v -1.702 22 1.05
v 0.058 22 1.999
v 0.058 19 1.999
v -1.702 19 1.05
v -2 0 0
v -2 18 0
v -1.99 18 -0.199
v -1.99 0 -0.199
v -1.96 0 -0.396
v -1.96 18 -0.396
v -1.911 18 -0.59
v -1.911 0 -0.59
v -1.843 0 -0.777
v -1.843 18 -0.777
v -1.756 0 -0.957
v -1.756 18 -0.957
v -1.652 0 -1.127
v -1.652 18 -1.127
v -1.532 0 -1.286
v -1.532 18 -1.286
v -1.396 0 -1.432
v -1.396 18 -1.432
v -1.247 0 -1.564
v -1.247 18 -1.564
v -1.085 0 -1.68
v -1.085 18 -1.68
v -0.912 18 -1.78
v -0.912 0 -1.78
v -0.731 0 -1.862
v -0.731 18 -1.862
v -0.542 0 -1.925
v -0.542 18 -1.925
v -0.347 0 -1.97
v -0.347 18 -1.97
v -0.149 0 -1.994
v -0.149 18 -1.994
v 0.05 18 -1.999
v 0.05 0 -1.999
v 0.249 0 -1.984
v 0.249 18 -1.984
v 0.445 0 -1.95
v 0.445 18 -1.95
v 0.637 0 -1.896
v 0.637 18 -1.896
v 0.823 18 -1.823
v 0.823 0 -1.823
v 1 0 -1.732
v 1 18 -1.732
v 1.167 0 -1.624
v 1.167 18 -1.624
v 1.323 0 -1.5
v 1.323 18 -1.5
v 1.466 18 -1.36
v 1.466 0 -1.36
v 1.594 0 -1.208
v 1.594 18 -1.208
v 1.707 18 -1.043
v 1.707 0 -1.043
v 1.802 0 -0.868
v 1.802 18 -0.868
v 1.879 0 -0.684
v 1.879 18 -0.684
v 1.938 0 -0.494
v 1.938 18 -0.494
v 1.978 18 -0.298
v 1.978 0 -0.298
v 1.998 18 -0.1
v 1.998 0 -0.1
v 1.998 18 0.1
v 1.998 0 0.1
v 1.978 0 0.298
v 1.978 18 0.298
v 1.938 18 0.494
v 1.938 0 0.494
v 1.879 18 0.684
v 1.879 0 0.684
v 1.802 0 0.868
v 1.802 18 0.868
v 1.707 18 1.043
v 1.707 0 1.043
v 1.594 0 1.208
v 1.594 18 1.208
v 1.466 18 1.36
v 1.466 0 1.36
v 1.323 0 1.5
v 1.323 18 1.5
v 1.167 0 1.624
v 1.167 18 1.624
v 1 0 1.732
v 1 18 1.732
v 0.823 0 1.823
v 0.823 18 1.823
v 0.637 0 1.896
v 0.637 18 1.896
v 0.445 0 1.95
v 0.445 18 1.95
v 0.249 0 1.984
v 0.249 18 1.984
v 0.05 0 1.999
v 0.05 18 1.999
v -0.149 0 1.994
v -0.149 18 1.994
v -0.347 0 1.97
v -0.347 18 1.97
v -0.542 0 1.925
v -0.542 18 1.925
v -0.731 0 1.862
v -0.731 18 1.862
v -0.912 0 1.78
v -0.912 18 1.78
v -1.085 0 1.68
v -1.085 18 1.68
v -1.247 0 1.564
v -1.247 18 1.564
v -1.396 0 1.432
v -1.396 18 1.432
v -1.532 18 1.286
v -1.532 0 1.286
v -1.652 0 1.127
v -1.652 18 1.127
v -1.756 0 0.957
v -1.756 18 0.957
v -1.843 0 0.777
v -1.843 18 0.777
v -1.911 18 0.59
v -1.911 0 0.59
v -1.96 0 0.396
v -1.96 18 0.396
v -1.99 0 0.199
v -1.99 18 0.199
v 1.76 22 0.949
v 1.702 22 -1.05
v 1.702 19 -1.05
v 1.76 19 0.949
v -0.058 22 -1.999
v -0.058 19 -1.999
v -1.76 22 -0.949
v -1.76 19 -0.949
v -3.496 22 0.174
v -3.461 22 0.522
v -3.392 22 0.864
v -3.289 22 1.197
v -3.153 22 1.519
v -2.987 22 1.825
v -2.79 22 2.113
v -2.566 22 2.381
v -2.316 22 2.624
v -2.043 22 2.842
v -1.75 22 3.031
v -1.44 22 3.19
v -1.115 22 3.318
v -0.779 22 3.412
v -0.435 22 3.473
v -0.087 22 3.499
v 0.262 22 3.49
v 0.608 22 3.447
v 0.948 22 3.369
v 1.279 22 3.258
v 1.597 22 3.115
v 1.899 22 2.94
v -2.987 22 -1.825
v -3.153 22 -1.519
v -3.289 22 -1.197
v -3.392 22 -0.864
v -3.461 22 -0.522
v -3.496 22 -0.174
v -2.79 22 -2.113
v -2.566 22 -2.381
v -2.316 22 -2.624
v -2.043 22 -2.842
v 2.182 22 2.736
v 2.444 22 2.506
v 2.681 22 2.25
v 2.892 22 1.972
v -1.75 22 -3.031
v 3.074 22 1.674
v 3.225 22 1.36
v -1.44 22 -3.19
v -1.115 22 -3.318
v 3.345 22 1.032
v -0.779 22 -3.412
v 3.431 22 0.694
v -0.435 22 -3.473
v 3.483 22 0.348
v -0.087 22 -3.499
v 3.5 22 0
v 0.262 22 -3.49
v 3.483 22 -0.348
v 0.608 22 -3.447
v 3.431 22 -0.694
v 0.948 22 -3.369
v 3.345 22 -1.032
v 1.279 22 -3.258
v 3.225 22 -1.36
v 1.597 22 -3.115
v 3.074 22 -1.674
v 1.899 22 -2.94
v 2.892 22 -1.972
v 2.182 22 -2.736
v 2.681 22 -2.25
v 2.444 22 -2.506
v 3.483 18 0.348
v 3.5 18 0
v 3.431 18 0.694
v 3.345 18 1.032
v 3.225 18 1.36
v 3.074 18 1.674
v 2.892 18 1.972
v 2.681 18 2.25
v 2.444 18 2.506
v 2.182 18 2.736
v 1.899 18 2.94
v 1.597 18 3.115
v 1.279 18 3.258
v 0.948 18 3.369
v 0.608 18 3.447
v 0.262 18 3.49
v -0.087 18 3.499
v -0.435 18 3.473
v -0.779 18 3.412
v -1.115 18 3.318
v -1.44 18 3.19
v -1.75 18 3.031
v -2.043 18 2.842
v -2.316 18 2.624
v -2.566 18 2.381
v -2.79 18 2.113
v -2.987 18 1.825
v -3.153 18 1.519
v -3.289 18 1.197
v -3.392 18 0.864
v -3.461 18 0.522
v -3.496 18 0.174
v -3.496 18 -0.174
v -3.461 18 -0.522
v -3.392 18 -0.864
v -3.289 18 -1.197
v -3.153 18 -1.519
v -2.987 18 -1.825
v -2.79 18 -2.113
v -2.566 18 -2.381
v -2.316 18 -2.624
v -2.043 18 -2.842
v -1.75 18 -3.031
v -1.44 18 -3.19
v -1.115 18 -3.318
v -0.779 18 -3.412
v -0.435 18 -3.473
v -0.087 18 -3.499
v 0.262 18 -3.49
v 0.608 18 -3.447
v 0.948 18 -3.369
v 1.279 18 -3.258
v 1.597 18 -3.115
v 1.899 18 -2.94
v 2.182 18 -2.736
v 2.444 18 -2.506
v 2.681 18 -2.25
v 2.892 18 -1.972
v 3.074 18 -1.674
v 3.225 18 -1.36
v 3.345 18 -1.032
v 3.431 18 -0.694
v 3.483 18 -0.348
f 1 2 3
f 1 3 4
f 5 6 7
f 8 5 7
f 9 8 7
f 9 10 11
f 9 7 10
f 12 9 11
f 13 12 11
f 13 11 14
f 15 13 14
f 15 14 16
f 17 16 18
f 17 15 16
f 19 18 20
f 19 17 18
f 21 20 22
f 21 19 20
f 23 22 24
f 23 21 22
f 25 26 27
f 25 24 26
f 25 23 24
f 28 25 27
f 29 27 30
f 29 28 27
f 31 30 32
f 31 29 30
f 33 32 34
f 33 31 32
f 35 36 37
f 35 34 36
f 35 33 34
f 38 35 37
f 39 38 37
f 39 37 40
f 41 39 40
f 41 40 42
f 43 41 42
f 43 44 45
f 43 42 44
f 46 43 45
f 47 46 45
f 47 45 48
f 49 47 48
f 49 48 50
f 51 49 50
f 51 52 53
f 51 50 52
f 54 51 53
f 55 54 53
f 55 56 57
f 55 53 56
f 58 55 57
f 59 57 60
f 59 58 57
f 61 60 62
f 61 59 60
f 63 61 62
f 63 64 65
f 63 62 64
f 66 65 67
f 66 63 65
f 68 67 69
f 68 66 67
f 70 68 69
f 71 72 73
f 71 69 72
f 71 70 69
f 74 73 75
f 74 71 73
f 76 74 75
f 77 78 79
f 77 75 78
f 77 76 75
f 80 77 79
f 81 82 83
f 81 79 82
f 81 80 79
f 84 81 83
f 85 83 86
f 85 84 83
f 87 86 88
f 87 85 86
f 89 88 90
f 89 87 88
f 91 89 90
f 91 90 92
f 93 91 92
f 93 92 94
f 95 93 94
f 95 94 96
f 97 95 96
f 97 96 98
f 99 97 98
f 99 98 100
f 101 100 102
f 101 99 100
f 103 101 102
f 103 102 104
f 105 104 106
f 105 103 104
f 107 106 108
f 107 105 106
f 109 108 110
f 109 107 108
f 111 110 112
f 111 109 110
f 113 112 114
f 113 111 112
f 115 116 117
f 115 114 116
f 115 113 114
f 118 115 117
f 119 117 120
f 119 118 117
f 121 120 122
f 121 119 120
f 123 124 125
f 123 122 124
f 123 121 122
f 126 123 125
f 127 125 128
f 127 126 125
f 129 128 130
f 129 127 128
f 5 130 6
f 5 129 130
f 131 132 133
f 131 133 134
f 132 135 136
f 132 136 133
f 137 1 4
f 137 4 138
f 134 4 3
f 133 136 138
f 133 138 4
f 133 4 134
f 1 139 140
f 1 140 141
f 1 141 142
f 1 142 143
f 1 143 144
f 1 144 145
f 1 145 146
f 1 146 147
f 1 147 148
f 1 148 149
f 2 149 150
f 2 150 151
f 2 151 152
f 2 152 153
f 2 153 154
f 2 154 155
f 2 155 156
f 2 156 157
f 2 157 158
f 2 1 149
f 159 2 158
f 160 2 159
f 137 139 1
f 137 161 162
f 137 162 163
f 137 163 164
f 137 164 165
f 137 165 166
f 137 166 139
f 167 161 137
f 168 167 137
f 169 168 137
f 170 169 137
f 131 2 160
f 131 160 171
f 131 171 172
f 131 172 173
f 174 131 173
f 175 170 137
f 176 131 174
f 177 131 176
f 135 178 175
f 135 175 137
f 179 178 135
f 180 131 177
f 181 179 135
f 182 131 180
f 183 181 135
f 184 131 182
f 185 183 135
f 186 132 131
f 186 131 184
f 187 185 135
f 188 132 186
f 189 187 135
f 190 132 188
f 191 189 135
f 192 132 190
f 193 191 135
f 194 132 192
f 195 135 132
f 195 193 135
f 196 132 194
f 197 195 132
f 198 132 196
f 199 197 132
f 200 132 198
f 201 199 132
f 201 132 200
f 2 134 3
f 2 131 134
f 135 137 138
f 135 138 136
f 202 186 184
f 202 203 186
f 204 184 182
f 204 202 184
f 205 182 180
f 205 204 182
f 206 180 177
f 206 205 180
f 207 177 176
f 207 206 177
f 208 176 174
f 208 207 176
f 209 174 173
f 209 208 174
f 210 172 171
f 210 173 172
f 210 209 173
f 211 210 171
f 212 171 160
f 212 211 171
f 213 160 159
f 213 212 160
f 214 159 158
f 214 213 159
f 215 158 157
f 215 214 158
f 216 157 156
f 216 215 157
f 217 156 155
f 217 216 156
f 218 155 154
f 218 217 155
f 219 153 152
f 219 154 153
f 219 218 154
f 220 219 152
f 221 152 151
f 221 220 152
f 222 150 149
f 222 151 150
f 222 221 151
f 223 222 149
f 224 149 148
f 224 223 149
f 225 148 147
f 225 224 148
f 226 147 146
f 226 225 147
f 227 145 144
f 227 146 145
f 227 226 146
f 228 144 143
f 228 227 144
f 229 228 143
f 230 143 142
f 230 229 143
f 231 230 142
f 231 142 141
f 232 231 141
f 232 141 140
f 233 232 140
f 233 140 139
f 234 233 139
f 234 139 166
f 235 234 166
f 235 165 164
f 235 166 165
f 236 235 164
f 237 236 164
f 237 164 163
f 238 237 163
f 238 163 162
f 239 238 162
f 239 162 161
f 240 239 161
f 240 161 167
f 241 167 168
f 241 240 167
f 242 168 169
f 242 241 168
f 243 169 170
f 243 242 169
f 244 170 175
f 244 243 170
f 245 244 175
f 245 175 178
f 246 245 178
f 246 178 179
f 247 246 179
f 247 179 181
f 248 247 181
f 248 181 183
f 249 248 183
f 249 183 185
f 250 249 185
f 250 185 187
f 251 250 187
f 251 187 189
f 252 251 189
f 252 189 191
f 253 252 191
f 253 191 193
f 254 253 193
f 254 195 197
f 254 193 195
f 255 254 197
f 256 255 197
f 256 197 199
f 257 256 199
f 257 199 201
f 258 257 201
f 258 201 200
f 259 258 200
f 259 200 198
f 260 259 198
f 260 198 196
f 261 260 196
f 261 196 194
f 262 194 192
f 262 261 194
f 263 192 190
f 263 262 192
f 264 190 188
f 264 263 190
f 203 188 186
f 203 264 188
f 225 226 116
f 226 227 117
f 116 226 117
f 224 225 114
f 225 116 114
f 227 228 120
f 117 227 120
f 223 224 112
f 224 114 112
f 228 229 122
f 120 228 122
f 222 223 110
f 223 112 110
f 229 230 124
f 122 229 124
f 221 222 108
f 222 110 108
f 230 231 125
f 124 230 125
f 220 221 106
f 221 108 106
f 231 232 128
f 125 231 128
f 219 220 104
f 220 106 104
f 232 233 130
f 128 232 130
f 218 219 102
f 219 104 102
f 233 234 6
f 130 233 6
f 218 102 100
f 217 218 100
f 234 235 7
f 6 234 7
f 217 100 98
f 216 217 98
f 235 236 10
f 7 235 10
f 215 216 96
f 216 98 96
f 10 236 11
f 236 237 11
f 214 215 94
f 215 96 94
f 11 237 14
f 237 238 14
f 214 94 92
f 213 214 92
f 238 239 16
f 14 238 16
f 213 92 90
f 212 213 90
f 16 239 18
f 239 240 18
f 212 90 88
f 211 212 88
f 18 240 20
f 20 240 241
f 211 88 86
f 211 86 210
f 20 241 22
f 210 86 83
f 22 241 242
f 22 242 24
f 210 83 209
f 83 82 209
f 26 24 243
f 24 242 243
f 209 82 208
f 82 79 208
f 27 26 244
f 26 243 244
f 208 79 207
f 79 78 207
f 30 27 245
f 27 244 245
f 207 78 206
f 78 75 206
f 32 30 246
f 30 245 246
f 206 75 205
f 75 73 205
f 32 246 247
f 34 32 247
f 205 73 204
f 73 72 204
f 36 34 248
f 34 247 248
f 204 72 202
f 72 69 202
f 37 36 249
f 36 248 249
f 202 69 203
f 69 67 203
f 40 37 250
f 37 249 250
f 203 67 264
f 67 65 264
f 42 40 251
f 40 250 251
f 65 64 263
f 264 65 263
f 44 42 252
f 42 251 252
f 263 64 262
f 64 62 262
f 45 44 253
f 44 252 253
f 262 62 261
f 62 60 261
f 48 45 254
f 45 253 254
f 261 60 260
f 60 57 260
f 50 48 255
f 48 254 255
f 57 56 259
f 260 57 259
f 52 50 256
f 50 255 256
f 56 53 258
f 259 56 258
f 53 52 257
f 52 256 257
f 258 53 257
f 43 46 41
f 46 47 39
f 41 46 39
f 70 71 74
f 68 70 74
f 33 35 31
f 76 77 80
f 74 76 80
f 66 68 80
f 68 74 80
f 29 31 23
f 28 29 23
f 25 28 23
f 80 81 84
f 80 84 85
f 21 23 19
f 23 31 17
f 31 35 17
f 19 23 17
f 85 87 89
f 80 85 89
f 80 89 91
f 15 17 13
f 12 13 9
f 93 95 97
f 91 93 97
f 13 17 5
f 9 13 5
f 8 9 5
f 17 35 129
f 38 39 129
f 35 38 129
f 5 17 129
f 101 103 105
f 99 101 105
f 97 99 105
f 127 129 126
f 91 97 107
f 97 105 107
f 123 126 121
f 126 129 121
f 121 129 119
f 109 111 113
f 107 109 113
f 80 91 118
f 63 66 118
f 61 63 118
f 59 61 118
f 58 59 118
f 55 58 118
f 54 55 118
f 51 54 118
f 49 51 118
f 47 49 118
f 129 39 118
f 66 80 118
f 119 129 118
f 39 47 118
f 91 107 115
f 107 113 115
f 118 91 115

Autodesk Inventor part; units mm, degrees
ref_plane "YZ Plane" through (0, 0, 0) normal (1, 0, 0) x (0, 1, 0)
ref_plane "XZ Plane" through (0, 0, 0) normal (0, 1, 0) x (-1, 0, 0)
ref_plane "XY Plane" through (0, 0, 0) normal (0, 0, 1) x (1, 0, 0)
sketch "Sketch1" plane through (0, 0, 0) normal (0, 1, 0) x (-1, 0, 0)
  circle A0 centre (0, 0) radius 2
  dimension "d0" = 4
extrude "Extrusion1" add sketch "Sketch1" along normal blind 18
sketch "Sketch2" plane through (0, 18, 0) normal (0, 1, 0) x (1, 0, 0)
  circle A0 centre (0, 0) radius 3.5
  dimension "d5" = 7
thread "Thread1" size "M4x0.7" class "6g" standard "ANSI Metric M Profile" full length
extrude "Extrusion2" add sketch "Sketch2" along normal blind 4
sketch "Sketch3" plane through (0, 22, 0) normal (0, 1, 0) x (1, 0, 0)
  circle A0 centre (0, 0) radius 3.5 projected
  circle A1 centre (0, 0) radius 2 projected
  line L0 (-1.7603, 0.9494) -> (-0.058, 1.9992)
  line L1 (-0.058, 1.9992) -> (1.7023, 1.0498)
  line L2 (1.7023, 1.0498) -> (1.7603, -0.9494)
  line L3 (1.7603, -0.9494) -> (0.058, -1.9992)
  line L4 (0.058, -1.9992) -> (-1.7023, -1.0498)
  line L5 (-1.7023, -1.0498) -> (-1.7603, 0.9494)
extrude "Extrusion3" cut sketch "Sketch3" against normal blind 3 contours L2 L3 L4 L5 L0 L1
properties part number "M4_18mm" material "Steel, Alloy"
